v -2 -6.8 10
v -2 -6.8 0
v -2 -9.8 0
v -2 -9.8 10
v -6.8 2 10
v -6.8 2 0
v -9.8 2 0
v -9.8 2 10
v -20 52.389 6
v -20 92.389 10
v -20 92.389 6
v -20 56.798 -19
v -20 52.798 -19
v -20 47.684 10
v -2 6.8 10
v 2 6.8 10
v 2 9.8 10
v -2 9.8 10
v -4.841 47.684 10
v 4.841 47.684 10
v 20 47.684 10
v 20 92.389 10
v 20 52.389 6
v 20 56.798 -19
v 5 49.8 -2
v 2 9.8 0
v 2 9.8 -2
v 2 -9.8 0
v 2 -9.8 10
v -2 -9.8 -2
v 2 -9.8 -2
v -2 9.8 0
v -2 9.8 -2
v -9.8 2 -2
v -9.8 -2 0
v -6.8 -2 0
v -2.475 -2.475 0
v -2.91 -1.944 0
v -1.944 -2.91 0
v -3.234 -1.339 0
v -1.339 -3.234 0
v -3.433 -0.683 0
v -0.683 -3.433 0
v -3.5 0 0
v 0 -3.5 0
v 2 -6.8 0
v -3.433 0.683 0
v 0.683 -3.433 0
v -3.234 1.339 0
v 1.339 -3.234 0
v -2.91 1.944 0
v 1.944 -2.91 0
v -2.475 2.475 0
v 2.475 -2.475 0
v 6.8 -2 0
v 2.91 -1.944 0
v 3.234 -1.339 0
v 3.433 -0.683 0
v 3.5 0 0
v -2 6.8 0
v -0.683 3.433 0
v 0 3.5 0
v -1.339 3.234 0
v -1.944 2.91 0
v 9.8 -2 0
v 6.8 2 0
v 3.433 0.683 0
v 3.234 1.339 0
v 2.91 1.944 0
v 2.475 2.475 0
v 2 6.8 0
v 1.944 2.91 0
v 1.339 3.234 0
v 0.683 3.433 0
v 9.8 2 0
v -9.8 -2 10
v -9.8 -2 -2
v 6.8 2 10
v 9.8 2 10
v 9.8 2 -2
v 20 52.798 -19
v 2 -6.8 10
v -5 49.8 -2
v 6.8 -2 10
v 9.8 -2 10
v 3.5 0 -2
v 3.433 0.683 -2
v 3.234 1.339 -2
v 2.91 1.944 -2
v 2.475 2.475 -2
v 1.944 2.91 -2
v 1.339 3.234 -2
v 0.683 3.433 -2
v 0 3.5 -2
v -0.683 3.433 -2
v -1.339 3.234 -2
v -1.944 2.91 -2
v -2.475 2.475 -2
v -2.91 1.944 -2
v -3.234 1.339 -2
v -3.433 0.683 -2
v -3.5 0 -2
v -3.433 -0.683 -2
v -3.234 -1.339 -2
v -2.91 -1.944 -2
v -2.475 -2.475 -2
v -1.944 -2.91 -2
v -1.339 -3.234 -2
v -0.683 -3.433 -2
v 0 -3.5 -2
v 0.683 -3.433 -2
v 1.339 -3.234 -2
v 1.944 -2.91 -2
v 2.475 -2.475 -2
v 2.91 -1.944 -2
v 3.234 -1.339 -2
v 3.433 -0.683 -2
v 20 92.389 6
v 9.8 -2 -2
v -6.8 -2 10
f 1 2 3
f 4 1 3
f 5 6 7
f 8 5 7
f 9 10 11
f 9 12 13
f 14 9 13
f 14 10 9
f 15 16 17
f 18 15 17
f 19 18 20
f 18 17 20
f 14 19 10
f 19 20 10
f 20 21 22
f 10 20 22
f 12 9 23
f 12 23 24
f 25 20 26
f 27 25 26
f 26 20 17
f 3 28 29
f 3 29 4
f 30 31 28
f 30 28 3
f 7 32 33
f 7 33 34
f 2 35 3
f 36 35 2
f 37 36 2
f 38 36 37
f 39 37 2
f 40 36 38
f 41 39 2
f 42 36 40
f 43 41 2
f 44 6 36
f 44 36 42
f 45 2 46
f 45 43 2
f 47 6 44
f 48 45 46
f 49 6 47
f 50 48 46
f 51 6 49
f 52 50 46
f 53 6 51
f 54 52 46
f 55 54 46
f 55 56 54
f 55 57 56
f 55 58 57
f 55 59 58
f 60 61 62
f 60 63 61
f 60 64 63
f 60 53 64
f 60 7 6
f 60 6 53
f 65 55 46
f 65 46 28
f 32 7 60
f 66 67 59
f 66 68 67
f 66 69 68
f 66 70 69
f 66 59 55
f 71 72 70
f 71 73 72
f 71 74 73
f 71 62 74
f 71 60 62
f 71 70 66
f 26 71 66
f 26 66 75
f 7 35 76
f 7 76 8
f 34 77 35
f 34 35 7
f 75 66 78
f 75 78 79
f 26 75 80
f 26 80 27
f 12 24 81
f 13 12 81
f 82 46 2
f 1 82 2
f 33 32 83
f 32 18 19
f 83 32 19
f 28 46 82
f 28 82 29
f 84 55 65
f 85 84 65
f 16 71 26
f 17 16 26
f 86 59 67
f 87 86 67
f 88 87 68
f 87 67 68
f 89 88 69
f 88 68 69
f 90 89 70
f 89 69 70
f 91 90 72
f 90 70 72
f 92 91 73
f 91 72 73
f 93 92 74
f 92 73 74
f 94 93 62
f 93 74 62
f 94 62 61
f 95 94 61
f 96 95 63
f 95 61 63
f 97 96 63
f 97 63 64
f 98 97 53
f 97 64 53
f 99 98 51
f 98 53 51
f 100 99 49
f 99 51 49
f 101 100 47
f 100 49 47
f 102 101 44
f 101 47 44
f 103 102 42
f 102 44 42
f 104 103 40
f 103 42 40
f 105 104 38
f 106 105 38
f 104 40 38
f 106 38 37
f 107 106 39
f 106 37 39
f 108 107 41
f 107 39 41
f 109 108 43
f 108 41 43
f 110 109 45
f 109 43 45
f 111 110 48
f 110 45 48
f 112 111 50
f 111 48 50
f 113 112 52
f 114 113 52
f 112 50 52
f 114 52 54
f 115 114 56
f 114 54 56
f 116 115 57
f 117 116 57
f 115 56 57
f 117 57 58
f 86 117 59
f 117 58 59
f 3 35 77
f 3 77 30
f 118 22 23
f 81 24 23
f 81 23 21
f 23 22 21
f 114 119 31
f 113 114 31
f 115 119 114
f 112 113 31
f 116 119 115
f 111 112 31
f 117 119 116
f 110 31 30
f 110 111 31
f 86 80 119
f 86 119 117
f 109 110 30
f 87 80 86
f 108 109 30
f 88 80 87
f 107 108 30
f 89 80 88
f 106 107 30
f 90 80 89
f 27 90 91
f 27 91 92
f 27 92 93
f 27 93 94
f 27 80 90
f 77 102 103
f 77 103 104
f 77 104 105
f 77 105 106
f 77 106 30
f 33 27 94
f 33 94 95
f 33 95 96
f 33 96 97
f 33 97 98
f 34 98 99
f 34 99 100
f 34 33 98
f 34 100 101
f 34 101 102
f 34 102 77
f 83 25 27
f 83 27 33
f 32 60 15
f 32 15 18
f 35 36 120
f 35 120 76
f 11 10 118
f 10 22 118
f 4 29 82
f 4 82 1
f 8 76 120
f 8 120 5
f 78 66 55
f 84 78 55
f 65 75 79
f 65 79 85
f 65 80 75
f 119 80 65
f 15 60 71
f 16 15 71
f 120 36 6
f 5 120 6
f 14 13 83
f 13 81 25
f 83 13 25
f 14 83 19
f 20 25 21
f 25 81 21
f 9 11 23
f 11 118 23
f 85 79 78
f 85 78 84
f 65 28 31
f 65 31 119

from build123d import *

# Parameters (mm, degrees)
SKETCH_R           = 3.5
PAD_DEPTH          = 2
SKETCH001_W        = 4
SKETCH001_H        = 3
PAD001_DEPTH       = 10
POLARPATTERN_COUNT = 4
PAD002_DEPTH       = 10
PAD004_DEPTH       = 2
PAD005_DEPTH       = 20


with BuildPart() as part:
    # Sketch → Pad (new body)
    with BuildSketch(Plane.XY):
        Polygon((-9.8, 2), (-9.8, -2), (-2, -9.8), (2, -9.8), (9.8, -2), (9.8, 2), (2, 9.8), (-2, 9.8), align=None)
        Circle(SKETCH_R, mode=Mode.SUBTRACT)
    extrude(amount=-PAD_DEPTH)

    # Sketch001 → Pad001 (join)
    with BuildSketch(Plane.XY):
        with Locations((0, 8.3)):
            Rectangle(SKETCH001_W, SKETCH001_H)
    pad001 = extrude(amount=PAD001_DEPTH)

    # PolarPattern: Pad001 ×4 about axis
    polarpattern_axis = Axis((0, 0, 0), (0, 0, 1))
    for i in range(1, POLARPATTERN_COUNT):
        add(pad001.rotate(polarpattern_axis, i * 360 / POLARPATTERN_COUNT))

    # Sketch002 → Pad002 (join)
    with BuildSketch(Plane.XY):
        Polygon((-2, 9.8), (-5, 49.8), (5, 49.8), (2, 9.8), align=None)
    extrude(amount=PAD002_DEPTH)

    # Sketch002 → Pad004 (join)
    with BuildSketch(Plane.XY):
        Polygon((-2, 9.8), (-5, 49.8), (5, 49.8), (2, 9.8), align=None)
    extrude(amount=-PAD004_DEPTH)

    # Sketch003 → Pad005 (join, symmetric)
    with BuildSketch(Plane.YZ):
        Polygon((47.684076, 10), (92.389384, 10), (92.389384, 6), (52.389384, 6), (56.797559, -19), (52.797559, -19), align=None)
    extrude(amount=PAD005_DEPTH, both=True)


solid = part.part
